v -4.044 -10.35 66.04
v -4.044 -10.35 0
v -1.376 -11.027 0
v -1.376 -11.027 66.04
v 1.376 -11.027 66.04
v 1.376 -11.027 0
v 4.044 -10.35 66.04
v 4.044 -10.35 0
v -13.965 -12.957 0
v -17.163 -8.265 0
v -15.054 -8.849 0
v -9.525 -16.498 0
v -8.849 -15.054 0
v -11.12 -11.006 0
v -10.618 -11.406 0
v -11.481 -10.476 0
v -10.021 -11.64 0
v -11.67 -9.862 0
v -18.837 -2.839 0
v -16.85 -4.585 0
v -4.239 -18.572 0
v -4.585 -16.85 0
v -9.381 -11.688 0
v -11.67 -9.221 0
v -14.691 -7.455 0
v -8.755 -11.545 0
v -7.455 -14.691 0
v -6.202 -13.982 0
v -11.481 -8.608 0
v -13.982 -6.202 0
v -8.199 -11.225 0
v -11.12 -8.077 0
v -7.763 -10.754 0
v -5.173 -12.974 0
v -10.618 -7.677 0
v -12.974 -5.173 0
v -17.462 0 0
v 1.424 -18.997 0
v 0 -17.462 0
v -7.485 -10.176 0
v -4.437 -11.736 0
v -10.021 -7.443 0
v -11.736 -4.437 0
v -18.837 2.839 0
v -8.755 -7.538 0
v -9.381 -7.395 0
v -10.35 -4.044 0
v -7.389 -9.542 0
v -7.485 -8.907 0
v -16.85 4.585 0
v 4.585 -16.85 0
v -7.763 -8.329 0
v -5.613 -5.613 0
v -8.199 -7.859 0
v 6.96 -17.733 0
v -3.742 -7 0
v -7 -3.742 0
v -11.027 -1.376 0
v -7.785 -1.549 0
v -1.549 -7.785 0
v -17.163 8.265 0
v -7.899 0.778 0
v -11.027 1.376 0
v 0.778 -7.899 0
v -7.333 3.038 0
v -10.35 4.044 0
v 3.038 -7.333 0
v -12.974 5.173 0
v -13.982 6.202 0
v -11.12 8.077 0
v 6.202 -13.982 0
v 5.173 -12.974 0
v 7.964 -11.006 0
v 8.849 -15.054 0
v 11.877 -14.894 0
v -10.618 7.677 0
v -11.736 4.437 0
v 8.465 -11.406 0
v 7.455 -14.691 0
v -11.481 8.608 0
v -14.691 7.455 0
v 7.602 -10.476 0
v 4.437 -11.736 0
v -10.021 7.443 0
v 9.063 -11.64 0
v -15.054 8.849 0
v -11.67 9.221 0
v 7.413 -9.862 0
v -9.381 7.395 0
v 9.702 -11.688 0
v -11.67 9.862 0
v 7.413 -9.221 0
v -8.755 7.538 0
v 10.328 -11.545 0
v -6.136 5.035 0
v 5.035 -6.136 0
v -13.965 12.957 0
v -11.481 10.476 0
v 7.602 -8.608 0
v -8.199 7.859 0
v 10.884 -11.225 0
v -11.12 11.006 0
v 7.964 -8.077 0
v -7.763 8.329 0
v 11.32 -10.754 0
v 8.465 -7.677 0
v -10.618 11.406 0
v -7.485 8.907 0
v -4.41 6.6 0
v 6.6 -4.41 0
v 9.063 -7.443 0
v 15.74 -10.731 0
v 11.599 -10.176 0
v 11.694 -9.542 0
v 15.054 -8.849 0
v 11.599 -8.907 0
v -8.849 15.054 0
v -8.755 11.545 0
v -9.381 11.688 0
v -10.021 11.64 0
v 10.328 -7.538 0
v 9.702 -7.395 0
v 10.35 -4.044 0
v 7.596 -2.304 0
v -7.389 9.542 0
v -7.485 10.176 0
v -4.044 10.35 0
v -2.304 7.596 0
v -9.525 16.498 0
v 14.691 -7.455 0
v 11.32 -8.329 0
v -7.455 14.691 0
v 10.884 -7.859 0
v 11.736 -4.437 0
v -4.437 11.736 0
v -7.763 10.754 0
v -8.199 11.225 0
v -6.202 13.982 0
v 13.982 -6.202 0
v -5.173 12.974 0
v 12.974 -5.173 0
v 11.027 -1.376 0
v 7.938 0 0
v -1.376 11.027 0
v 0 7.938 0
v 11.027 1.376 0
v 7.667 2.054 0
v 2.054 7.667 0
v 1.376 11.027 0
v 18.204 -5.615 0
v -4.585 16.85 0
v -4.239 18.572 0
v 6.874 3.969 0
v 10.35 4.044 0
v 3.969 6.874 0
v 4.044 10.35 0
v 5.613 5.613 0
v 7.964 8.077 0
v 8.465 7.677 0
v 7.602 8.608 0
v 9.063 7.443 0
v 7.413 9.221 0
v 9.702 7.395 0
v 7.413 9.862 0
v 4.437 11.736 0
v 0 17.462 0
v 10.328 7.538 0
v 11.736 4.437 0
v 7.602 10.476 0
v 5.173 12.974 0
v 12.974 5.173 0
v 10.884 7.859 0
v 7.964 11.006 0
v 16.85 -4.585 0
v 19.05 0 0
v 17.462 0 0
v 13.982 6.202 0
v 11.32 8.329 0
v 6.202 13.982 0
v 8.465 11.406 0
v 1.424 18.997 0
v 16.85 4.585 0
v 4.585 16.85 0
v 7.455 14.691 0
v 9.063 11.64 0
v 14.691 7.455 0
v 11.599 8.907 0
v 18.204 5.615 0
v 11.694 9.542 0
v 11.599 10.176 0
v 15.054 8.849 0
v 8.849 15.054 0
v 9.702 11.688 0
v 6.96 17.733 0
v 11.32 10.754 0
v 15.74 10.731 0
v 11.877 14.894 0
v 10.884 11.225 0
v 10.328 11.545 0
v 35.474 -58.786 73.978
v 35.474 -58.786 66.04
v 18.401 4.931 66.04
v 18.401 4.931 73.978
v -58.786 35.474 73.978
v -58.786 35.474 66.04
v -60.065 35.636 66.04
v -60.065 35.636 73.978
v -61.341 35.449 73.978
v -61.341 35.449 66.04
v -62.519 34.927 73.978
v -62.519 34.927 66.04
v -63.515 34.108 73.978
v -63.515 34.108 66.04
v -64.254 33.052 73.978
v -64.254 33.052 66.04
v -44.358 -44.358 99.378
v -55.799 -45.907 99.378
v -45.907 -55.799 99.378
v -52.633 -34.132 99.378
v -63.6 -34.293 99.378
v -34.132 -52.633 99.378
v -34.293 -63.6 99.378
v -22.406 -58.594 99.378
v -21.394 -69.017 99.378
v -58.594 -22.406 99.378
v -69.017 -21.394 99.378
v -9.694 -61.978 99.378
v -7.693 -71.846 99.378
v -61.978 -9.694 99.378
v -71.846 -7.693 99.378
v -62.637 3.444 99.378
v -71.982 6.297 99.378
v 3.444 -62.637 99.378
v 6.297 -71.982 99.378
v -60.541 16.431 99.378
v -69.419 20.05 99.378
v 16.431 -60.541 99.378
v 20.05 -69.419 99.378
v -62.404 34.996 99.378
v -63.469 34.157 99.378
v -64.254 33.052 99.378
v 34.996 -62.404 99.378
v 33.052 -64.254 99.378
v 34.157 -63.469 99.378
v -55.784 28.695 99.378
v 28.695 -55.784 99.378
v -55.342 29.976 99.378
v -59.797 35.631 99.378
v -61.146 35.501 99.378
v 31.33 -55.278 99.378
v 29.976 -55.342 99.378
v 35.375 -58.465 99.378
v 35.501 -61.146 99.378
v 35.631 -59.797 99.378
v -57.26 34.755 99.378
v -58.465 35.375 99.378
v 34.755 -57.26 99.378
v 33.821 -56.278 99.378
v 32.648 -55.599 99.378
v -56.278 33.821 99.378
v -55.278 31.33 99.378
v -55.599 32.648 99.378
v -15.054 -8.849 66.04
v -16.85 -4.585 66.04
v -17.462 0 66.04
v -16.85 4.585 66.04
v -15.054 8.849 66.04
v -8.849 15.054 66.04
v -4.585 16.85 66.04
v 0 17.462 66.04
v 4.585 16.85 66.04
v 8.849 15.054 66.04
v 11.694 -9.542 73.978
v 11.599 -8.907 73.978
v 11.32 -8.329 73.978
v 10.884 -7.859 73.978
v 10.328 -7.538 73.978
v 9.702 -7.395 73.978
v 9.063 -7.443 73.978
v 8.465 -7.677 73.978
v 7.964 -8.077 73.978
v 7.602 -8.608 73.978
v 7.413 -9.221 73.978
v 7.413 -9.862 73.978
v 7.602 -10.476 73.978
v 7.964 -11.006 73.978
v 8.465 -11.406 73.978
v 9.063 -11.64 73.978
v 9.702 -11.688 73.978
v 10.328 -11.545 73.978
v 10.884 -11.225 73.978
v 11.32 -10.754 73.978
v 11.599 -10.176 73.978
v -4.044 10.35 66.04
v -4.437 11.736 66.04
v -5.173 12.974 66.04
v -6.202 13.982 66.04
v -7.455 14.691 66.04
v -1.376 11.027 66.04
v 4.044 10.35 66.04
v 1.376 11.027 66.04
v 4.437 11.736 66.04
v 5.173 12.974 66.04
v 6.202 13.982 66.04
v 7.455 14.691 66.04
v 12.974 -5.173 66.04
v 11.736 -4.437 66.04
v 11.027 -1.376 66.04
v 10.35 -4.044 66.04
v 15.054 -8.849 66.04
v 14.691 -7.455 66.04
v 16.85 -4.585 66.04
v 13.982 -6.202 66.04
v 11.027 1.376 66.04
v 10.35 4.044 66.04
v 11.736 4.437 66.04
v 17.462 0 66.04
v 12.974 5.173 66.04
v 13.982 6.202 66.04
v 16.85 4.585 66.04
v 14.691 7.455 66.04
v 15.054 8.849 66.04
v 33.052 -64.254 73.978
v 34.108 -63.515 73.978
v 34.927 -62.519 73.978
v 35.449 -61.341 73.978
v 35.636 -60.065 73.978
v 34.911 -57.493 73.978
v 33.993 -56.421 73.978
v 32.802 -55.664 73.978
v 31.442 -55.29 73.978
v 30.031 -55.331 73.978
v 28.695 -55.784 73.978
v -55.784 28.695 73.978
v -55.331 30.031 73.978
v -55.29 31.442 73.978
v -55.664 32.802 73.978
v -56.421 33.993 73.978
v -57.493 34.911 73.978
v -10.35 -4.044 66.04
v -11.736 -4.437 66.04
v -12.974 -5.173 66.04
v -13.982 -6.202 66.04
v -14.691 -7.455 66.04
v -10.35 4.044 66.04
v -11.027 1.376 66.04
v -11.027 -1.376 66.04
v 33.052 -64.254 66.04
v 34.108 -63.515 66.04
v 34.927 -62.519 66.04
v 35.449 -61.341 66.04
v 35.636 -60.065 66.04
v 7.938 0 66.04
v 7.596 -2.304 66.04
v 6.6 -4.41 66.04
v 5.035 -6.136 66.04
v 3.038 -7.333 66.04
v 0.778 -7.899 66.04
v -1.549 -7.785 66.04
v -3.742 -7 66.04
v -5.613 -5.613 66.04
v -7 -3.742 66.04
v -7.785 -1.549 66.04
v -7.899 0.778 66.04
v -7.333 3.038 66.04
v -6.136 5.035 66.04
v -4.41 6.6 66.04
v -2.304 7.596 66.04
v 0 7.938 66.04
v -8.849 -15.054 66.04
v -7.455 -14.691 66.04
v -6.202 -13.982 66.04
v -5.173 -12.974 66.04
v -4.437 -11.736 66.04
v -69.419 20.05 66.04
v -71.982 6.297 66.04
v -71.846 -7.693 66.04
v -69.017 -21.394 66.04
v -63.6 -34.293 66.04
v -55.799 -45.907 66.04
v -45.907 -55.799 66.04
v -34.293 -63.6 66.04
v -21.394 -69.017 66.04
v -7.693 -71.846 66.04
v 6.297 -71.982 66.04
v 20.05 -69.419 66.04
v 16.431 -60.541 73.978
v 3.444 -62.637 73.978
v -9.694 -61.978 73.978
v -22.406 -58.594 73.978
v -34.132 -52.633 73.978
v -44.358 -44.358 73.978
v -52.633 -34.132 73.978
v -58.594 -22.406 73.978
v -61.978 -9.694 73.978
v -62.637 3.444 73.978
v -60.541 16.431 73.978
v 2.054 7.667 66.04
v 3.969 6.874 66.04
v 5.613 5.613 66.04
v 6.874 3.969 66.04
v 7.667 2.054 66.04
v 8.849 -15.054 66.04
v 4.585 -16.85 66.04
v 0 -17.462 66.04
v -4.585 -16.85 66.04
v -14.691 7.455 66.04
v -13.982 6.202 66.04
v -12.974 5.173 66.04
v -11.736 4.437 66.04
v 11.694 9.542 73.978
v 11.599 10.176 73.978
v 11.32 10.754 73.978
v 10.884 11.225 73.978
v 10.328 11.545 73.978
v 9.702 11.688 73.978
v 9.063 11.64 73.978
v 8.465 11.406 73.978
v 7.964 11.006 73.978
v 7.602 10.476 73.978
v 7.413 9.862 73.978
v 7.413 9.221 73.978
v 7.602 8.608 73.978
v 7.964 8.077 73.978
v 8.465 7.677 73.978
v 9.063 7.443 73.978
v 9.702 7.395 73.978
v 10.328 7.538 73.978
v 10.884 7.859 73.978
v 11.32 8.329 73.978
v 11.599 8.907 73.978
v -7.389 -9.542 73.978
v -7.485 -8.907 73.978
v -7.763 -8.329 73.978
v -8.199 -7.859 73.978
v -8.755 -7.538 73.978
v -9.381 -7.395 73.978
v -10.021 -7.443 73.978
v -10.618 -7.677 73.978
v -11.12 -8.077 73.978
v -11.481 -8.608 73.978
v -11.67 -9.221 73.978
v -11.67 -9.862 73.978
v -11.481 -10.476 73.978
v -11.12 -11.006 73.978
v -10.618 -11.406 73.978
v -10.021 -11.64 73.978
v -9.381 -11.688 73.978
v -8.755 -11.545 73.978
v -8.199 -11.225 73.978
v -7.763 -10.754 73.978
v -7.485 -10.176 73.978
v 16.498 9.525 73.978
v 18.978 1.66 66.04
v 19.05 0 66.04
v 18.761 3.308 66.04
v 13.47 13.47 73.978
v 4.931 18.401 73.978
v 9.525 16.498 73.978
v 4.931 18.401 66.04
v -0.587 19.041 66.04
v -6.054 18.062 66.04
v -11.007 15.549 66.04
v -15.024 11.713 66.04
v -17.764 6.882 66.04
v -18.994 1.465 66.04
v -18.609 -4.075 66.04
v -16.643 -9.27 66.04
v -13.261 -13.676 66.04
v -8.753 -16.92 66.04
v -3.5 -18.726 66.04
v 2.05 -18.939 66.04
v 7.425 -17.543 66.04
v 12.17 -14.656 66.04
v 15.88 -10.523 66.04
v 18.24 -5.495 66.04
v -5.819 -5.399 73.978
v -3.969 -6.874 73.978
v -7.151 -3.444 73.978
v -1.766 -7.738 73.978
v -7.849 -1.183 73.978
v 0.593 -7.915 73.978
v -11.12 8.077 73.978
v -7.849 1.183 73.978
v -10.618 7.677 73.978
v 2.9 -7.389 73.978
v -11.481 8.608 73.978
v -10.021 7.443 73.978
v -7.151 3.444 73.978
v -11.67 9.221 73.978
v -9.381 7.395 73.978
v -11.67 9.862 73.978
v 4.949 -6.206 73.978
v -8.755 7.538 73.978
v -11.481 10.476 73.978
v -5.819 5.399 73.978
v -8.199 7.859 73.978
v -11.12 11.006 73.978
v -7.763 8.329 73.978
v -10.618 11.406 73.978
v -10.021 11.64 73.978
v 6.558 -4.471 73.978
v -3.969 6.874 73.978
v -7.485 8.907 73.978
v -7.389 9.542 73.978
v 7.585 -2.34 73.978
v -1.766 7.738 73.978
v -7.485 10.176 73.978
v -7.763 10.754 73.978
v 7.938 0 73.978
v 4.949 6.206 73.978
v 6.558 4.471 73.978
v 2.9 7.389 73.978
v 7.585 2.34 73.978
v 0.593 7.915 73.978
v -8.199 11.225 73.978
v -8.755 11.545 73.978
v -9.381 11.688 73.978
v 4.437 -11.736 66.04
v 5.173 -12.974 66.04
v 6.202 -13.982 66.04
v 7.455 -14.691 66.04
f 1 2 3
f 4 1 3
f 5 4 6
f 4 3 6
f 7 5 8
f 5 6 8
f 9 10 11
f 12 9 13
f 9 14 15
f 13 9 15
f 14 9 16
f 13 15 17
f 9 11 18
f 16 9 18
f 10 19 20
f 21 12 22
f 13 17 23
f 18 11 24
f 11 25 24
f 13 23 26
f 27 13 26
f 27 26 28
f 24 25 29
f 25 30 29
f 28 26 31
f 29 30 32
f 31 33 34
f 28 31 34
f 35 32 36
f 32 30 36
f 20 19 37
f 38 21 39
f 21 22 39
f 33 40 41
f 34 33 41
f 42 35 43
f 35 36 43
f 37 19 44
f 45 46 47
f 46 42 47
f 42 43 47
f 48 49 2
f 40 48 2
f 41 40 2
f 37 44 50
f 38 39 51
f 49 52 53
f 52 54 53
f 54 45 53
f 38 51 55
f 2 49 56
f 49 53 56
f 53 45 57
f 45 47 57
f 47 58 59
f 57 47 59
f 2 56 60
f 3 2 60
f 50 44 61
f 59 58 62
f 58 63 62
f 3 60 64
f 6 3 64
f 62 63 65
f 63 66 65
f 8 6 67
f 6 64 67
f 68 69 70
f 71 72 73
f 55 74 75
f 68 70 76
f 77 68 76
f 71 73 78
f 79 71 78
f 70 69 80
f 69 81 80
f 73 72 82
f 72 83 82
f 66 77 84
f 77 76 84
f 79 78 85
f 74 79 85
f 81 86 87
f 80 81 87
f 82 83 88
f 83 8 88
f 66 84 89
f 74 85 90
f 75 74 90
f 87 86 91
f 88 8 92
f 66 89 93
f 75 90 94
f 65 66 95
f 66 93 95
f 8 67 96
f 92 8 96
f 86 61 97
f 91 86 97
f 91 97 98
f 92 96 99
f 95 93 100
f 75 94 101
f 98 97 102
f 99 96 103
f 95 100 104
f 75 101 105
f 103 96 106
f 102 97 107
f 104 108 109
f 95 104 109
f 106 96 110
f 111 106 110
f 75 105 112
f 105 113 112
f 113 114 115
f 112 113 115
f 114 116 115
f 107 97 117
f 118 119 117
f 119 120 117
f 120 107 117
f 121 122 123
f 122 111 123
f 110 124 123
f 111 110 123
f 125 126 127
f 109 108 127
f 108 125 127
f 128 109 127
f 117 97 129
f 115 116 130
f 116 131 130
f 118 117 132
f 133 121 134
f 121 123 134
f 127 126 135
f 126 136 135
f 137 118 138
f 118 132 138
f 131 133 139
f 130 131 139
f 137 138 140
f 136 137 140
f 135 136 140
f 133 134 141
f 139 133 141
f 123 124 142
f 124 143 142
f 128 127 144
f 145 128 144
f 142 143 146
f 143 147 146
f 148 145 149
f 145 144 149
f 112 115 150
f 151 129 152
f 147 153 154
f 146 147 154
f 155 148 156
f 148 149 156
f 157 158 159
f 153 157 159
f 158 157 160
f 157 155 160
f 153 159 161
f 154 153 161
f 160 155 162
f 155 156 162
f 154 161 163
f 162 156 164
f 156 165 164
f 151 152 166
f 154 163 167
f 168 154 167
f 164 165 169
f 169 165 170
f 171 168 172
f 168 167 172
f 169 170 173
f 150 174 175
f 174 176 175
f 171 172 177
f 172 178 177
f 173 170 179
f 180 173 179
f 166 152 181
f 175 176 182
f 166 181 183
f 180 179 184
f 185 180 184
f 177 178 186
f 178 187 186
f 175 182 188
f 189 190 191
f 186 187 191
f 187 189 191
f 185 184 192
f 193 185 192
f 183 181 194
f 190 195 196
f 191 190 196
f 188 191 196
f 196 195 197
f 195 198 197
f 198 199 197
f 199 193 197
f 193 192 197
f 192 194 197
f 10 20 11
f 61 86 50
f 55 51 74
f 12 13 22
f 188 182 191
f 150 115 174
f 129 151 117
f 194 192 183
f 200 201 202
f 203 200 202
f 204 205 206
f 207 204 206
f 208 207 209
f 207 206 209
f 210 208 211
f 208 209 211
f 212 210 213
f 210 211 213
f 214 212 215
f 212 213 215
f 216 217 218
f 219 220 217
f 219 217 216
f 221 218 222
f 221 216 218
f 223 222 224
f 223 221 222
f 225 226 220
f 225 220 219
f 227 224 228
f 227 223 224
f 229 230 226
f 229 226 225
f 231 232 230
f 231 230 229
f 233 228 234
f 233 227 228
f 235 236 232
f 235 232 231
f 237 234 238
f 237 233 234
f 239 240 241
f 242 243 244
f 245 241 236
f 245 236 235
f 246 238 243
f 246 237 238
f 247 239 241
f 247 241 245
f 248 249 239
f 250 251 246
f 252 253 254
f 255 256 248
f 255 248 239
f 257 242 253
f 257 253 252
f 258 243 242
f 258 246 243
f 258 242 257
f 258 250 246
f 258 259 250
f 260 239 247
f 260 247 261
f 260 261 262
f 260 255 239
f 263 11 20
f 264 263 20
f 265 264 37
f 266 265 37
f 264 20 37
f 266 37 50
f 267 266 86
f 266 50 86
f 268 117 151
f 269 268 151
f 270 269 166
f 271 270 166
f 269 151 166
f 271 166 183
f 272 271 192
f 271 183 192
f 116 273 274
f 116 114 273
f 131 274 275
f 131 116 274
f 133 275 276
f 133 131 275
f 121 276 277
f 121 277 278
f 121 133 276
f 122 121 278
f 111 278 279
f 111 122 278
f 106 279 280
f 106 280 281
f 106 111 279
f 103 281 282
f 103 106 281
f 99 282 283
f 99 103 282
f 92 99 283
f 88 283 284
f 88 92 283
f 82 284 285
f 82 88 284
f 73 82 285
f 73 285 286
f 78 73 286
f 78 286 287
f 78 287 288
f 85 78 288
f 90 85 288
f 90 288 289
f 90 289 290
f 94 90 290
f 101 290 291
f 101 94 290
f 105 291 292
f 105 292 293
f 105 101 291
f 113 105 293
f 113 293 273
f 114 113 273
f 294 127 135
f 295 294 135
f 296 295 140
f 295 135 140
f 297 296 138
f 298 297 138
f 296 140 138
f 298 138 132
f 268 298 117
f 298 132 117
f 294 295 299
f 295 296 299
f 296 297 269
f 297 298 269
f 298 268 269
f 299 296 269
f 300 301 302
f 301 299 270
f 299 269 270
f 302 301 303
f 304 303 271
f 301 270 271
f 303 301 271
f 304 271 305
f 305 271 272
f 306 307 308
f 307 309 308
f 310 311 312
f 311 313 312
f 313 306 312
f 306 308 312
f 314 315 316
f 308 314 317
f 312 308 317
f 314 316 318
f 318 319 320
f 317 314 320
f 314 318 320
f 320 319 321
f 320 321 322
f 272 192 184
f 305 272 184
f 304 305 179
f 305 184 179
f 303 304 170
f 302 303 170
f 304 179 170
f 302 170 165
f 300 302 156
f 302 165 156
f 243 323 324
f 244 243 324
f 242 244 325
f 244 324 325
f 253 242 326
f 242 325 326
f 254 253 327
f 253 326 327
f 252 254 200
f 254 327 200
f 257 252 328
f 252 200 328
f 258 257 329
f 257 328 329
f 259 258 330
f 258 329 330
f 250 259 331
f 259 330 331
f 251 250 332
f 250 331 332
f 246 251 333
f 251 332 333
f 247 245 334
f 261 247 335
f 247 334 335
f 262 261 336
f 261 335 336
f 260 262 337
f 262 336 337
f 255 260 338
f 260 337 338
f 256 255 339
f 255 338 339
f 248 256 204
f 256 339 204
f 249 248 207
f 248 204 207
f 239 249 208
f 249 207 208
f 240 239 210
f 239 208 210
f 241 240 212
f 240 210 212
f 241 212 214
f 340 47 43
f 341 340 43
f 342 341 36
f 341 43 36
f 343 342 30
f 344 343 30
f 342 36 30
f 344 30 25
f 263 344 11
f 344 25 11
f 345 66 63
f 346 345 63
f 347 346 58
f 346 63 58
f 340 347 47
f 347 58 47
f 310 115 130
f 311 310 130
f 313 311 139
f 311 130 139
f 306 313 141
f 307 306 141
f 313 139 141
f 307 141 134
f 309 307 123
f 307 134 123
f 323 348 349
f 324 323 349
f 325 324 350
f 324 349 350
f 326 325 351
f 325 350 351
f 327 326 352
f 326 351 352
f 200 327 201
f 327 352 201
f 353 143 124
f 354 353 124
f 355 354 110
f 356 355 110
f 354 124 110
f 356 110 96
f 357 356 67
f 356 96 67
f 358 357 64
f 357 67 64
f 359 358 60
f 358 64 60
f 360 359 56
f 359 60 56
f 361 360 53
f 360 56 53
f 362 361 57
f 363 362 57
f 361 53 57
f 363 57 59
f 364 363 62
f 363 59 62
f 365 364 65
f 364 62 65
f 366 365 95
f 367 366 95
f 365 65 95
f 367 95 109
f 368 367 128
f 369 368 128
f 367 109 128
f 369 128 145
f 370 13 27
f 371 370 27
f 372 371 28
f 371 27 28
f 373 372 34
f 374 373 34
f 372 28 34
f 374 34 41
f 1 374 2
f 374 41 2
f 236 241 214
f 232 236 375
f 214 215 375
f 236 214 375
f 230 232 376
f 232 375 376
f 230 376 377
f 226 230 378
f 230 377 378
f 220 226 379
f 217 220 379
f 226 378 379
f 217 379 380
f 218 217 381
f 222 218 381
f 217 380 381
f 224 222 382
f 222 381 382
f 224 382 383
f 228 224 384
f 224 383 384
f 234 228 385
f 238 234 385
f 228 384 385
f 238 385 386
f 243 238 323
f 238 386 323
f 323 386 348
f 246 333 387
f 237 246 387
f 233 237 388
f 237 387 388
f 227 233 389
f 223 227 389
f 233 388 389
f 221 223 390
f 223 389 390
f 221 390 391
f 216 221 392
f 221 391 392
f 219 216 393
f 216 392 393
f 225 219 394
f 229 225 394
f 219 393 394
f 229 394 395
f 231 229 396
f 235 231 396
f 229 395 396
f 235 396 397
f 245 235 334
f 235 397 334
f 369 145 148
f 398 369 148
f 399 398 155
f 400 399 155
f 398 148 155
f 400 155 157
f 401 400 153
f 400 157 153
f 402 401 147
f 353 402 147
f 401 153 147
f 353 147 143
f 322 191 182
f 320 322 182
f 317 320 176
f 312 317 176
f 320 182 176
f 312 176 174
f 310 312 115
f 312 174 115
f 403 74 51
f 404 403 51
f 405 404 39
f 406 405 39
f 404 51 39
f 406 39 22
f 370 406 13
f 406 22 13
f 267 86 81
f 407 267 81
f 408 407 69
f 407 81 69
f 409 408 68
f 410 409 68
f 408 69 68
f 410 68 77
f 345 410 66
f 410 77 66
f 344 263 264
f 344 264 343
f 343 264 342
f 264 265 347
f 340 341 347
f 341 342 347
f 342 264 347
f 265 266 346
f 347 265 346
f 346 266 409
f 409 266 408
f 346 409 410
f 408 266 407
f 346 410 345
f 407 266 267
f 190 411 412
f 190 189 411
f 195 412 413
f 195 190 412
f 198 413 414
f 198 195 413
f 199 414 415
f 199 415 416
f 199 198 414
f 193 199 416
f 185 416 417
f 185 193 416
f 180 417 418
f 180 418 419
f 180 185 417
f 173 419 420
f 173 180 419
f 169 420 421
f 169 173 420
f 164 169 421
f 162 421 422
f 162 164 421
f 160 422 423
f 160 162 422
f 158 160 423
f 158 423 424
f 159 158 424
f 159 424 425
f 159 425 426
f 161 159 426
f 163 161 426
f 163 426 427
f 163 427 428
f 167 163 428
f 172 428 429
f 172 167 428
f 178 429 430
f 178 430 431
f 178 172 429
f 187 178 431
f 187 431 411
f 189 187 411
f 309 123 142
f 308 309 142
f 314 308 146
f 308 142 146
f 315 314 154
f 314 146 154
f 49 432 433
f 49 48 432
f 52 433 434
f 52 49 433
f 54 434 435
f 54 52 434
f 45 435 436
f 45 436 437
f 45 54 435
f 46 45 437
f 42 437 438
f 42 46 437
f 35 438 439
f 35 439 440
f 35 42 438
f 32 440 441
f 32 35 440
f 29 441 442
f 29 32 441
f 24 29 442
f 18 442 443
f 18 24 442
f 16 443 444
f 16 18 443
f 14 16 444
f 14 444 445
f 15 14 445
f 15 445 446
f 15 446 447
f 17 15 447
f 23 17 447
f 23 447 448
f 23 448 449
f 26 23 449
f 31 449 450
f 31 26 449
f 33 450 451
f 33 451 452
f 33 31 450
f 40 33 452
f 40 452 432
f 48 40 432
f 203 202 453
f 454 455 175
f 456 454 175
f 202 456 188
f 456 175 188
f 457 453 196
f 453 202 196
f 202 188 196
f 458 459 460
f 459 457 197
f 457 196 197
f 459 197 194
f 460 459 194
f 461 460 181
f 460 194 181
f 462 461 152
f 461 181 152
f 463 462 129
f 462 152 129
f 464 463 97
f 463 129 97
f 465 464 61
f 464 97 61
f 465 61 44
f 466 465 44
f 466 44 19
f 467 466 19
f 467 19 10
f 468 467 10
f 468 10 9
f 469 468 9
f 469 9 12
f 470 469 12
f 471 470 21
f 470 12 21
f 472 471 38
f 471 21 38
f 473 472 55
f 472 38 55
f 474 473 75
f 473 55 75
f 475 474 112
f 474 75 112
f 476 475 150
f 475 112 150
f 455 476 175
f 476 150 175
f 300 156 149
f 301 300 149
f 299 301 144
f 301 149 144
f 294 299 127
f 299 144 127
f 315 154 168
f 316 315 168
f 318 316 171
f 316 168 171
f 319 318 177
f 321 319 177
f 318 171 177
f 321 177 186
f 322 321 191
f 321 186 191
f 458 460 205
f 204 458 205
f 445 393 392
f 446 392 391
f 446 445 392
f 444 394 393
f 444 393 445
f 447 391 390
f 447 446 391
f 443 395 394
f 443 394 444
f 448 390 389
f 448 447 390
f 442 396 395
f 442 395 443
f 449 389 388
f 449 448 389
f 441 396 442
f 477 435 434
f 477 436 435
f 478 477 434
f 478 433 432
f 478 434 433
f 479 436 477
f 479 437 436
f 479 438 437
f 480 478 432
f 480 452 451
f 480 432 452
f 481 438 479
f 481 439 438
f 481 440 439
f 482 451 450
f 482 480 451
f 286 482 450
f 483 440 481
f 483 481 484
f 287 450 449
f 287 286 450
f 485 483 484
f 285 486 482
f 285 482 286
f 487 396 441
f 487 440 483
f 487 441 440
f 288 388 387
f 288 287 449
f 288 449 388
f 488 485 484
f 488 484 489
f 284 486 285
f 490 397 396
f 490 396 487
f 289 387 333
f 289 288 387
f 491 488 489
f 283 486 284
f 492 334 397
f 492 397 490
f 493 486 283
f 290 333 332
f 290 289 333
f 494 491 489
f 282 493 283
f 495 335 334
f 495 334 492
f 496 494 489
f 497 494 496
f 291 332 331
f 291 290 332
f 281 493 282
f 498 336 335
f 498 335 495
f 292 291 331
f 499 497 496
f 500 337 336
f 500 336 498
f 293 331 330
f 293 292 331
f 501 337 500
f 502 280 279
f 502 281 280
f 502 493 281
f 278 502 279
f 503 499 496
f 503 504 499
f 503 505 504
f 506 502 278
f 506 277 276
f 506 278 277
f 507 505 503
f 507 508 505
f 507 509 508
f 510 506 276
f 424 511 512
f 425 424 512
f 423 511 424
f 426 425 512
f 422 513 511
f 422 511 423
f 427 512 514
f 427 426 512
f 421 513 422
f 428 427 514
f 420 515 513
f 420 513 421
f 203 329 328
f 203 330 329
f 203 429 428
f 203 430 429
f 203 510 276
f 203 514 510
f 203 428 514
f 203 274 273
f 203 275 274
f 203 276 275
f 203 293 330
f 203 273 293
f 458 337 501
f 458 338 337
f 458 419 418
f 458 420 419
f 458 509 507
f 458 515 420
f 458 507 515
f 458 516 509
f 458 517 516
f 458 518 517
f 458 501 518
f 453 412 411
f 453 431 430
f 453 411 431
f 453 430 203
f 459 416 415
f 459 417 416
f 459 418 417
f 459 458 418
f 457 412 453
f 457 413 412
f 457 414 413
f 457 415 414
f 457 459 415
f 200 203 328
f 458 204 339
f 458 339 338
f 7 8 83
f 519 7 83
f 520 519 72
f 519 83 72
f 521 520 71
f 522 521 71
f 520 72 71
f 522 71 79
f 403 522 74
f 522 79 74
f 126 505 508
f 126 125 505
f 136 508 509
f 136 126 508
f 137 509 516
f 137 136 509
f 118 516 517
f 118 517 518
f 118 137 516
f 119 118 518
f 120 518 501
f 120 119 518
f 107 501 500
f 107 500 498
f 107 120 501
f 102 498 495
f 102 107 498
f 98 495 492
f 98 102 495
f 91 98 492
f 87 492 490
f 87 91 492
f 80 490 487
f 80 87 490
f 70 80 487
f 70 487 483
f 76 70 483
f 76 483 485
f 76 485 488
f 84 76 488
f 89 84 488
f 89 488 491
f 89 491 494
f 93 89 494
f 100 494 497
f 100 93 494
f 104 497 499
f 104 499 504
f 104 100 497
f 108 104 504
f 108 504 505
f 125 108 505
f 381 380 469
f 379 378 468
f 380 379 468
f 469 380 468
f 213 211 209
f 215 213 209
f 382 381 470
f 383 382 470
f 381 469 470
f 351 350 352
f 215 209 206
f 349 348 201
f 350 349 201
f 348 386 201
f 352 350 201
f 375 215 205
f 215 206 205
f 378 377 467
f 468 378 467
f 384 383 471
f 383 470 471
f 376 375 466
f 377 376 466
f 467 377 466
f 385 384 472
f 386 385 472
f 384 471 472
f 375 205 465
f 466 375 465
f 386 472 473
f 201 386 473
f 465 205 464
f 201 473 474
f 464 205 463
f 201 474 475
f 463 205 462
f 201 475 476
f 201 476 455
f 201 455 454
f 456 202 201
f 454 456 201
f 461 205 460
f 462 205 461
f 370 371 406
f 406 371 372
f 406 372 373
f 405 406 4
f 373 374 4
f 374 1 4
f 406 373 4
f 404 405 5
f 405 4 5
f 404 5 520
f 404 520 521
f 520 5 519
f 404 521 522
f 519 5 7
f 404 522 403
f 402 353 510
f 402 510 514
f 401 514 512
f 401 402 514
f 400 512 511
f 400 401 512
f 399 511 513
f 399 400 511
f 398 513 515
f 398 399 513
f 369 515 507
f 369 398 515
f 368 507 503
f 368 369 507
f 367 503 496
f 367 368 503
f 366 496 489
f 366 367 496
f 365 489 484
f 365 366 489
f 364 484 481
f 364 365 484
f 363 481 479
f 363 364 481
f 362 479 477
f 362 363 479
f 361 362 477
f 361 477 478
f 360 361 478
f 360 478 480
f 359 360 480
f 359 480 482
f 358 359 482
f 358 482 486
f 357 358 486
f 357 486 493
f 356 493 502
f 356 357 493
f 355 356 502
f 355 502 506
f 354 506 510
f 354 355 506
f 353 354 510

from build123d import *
from build123d import SkipClean  # not in build123d's __all__

# Parameters (mm, degrees)
F0_R     = 19.05
F0_R_2   = 2.15265
F1_DEPTH = 66.04
F3_DEPTH = 66.04
F4_COUNT = 4
F4_ANGLE = 270
F5_R     = 2.15265
F5_R_2   = 7.9375
F6_DEPTH = 7.9375
F8_DEPTH = 25.4


# Not quite as in the source:
# - after a boolean that leaves OpenCascade's solid faulty, fix() repairs it


with BuildPart() as f1:
    # F0 (on Top) → F1 (new body)
    with BuildSketch(Plane.XY):
        Circle(F0_R)
        with Locations((-9.5415221286, -9.5415221286)):
            Circle(F0_R_2, mode=Mode.SUBTRACT)
        with Locations((9.5415221286, -9.5415221286)):
            Circle(F0_R_2, mode=Mode.SUBTRACT)
        with Locations((-9.5415221286, 9.5415221286)):
            Circle(F0_R_2, mode=Mode.SUBTRACT)
        with BuildLine():
            ThreePointArc((0, 7.9375), (5.6126600757, 5.6126600757), (7.9375, 0))
            ThreePointArc((7.9375, 0), (-5.6126600757, -5.6126600757), (0, 7.9375))
        make_face(mode=Mode.SUBTRACT)
        with Locations((9.5415221286, 9.5415221286)):
            Circle(F0_R_2, mode=Mode.SUBTRACT)
    extrude(amount=F1_DEPTH)

    # F2 (on face) → F3 (cut, through all)
    with BuildSketch(Plane(origin=(0, 0, 0), x_dir=(1, 0, 0), z_dir=(0, 0, -1))):
        with BuildLine():
            ThreePointArc((8.8488960712, -15.0544327217), (5.6543471209, -13.5116335278), (4.0444600337, -10.350362278))
            ThreePointArc((4.0444600337, -10.350362278), (0, -11.1125), (-4.0444600337, -10.350362278))
            ThreePointArc((-4.0444600337, -10.350362278), (-5.6543471209, -13.5116335278), (-8.8488960712, -15.0544327217))
            ThreePointArc((-8.8488960712, -15.0544327217), (0, -17.4625), (8.8488960712, -15.0544327217))
        make_face()
    f3 = extrude(amount=-F3_DEPTH, mode=Mode.SUBTRACT)

    # F4: F3 ×4 about axis
    f4_axis = Axis((0, 0, 0), (0, 0, -1))
    for i in range(1, F4_COUNT):
        add(f3.rotate(f4_axis, i * F4_ANGLE / (F4_COUNT - 1)), clean=False, mode=Mode.SUBTRACT)

    # F5 (on face) → F6 (join)
    with BuildSketch(Plane.XY.offset(66.04)):
        with BuildLine():
            Line((35.4737477046, -58.7862808051), (18.4008869908, 4.9305028092))
            ThreePointArc((18.4008869908, 4.9305028092), (13.4703841816, 13.4703841816), (4.9305028092, 18.4008869908))
            Line((4.9305028092, 18.4008869908), (-58.7862808051, 35.4737477046))
            ThreePointArc((-58.7862808051, 35.4737477046), (-61.9475900585, 35.228016284), (-64.2539485249, 33.05201749))
            ThreePointArc((-64.2539485249, 33.05201749), (-51.093080555, -51.093080555), (33.05201749, -64.2539485249))
            ThreePointArc((33.05201749, -64.2539485249), (35.228016284, -61.9475900585), (35.4737477046, -58.7862808051))
        make_face()
        with Locations((-9.5415221286, -9.5415221286)):
            Circle(F5_R, mode=Mode.SUBTRACT)
        Circle(F5_R_2, mode=Mode.SUBTRACT)
        with Locations((9.5415221286, -9.5415221286)):
            Circle(F5_R, mode=Mode.SUBTRACT)
        with Locations((-9.5415221286, 9.5415221286)):
            Circle(F5_R, mode=Mode.SUBTRACT)
        with Locations((9.5415221286, 9.5415221286)):
            Circle(F5_R, mode=Mode.SUBTRACT)
    with SkipClean():  # cleaning this boolean's faces spoils the solid; the shape is the same uncleaned
        extrude(amount=F6_DEPTH)

    # F7 (on face) → F8 (join)
    with BuildSketch(Plane.XY.offset(73.9775)):
        with BuildLine():
            ThreePointArc((-55.7838644899, 28.6950344237), (-57.8404149742, 35.1085679744), (-64.2539485249, 33.05201749))
            ThreePointArc((-64.2539485249, 33.05201749), (-51.093080555, -51.093080555), (33.05201749, -64.2539485249))
            ThreePointArc((33.05201749, -64.2539485249), (35.1085679744, -57.8404149742), (28.6950344237, -55.7838644899))
            ThreePointArc((28.6950344237, -55.7838644899), (-44.3578884642, -44.3578884642), (-55.7838644899, 28.6950344237))
        make_face()
    extrude(amount=F8_DEPTH)

    add(f1.part.fix(), mode=Mode.REPLACE)


solid = f1.part
